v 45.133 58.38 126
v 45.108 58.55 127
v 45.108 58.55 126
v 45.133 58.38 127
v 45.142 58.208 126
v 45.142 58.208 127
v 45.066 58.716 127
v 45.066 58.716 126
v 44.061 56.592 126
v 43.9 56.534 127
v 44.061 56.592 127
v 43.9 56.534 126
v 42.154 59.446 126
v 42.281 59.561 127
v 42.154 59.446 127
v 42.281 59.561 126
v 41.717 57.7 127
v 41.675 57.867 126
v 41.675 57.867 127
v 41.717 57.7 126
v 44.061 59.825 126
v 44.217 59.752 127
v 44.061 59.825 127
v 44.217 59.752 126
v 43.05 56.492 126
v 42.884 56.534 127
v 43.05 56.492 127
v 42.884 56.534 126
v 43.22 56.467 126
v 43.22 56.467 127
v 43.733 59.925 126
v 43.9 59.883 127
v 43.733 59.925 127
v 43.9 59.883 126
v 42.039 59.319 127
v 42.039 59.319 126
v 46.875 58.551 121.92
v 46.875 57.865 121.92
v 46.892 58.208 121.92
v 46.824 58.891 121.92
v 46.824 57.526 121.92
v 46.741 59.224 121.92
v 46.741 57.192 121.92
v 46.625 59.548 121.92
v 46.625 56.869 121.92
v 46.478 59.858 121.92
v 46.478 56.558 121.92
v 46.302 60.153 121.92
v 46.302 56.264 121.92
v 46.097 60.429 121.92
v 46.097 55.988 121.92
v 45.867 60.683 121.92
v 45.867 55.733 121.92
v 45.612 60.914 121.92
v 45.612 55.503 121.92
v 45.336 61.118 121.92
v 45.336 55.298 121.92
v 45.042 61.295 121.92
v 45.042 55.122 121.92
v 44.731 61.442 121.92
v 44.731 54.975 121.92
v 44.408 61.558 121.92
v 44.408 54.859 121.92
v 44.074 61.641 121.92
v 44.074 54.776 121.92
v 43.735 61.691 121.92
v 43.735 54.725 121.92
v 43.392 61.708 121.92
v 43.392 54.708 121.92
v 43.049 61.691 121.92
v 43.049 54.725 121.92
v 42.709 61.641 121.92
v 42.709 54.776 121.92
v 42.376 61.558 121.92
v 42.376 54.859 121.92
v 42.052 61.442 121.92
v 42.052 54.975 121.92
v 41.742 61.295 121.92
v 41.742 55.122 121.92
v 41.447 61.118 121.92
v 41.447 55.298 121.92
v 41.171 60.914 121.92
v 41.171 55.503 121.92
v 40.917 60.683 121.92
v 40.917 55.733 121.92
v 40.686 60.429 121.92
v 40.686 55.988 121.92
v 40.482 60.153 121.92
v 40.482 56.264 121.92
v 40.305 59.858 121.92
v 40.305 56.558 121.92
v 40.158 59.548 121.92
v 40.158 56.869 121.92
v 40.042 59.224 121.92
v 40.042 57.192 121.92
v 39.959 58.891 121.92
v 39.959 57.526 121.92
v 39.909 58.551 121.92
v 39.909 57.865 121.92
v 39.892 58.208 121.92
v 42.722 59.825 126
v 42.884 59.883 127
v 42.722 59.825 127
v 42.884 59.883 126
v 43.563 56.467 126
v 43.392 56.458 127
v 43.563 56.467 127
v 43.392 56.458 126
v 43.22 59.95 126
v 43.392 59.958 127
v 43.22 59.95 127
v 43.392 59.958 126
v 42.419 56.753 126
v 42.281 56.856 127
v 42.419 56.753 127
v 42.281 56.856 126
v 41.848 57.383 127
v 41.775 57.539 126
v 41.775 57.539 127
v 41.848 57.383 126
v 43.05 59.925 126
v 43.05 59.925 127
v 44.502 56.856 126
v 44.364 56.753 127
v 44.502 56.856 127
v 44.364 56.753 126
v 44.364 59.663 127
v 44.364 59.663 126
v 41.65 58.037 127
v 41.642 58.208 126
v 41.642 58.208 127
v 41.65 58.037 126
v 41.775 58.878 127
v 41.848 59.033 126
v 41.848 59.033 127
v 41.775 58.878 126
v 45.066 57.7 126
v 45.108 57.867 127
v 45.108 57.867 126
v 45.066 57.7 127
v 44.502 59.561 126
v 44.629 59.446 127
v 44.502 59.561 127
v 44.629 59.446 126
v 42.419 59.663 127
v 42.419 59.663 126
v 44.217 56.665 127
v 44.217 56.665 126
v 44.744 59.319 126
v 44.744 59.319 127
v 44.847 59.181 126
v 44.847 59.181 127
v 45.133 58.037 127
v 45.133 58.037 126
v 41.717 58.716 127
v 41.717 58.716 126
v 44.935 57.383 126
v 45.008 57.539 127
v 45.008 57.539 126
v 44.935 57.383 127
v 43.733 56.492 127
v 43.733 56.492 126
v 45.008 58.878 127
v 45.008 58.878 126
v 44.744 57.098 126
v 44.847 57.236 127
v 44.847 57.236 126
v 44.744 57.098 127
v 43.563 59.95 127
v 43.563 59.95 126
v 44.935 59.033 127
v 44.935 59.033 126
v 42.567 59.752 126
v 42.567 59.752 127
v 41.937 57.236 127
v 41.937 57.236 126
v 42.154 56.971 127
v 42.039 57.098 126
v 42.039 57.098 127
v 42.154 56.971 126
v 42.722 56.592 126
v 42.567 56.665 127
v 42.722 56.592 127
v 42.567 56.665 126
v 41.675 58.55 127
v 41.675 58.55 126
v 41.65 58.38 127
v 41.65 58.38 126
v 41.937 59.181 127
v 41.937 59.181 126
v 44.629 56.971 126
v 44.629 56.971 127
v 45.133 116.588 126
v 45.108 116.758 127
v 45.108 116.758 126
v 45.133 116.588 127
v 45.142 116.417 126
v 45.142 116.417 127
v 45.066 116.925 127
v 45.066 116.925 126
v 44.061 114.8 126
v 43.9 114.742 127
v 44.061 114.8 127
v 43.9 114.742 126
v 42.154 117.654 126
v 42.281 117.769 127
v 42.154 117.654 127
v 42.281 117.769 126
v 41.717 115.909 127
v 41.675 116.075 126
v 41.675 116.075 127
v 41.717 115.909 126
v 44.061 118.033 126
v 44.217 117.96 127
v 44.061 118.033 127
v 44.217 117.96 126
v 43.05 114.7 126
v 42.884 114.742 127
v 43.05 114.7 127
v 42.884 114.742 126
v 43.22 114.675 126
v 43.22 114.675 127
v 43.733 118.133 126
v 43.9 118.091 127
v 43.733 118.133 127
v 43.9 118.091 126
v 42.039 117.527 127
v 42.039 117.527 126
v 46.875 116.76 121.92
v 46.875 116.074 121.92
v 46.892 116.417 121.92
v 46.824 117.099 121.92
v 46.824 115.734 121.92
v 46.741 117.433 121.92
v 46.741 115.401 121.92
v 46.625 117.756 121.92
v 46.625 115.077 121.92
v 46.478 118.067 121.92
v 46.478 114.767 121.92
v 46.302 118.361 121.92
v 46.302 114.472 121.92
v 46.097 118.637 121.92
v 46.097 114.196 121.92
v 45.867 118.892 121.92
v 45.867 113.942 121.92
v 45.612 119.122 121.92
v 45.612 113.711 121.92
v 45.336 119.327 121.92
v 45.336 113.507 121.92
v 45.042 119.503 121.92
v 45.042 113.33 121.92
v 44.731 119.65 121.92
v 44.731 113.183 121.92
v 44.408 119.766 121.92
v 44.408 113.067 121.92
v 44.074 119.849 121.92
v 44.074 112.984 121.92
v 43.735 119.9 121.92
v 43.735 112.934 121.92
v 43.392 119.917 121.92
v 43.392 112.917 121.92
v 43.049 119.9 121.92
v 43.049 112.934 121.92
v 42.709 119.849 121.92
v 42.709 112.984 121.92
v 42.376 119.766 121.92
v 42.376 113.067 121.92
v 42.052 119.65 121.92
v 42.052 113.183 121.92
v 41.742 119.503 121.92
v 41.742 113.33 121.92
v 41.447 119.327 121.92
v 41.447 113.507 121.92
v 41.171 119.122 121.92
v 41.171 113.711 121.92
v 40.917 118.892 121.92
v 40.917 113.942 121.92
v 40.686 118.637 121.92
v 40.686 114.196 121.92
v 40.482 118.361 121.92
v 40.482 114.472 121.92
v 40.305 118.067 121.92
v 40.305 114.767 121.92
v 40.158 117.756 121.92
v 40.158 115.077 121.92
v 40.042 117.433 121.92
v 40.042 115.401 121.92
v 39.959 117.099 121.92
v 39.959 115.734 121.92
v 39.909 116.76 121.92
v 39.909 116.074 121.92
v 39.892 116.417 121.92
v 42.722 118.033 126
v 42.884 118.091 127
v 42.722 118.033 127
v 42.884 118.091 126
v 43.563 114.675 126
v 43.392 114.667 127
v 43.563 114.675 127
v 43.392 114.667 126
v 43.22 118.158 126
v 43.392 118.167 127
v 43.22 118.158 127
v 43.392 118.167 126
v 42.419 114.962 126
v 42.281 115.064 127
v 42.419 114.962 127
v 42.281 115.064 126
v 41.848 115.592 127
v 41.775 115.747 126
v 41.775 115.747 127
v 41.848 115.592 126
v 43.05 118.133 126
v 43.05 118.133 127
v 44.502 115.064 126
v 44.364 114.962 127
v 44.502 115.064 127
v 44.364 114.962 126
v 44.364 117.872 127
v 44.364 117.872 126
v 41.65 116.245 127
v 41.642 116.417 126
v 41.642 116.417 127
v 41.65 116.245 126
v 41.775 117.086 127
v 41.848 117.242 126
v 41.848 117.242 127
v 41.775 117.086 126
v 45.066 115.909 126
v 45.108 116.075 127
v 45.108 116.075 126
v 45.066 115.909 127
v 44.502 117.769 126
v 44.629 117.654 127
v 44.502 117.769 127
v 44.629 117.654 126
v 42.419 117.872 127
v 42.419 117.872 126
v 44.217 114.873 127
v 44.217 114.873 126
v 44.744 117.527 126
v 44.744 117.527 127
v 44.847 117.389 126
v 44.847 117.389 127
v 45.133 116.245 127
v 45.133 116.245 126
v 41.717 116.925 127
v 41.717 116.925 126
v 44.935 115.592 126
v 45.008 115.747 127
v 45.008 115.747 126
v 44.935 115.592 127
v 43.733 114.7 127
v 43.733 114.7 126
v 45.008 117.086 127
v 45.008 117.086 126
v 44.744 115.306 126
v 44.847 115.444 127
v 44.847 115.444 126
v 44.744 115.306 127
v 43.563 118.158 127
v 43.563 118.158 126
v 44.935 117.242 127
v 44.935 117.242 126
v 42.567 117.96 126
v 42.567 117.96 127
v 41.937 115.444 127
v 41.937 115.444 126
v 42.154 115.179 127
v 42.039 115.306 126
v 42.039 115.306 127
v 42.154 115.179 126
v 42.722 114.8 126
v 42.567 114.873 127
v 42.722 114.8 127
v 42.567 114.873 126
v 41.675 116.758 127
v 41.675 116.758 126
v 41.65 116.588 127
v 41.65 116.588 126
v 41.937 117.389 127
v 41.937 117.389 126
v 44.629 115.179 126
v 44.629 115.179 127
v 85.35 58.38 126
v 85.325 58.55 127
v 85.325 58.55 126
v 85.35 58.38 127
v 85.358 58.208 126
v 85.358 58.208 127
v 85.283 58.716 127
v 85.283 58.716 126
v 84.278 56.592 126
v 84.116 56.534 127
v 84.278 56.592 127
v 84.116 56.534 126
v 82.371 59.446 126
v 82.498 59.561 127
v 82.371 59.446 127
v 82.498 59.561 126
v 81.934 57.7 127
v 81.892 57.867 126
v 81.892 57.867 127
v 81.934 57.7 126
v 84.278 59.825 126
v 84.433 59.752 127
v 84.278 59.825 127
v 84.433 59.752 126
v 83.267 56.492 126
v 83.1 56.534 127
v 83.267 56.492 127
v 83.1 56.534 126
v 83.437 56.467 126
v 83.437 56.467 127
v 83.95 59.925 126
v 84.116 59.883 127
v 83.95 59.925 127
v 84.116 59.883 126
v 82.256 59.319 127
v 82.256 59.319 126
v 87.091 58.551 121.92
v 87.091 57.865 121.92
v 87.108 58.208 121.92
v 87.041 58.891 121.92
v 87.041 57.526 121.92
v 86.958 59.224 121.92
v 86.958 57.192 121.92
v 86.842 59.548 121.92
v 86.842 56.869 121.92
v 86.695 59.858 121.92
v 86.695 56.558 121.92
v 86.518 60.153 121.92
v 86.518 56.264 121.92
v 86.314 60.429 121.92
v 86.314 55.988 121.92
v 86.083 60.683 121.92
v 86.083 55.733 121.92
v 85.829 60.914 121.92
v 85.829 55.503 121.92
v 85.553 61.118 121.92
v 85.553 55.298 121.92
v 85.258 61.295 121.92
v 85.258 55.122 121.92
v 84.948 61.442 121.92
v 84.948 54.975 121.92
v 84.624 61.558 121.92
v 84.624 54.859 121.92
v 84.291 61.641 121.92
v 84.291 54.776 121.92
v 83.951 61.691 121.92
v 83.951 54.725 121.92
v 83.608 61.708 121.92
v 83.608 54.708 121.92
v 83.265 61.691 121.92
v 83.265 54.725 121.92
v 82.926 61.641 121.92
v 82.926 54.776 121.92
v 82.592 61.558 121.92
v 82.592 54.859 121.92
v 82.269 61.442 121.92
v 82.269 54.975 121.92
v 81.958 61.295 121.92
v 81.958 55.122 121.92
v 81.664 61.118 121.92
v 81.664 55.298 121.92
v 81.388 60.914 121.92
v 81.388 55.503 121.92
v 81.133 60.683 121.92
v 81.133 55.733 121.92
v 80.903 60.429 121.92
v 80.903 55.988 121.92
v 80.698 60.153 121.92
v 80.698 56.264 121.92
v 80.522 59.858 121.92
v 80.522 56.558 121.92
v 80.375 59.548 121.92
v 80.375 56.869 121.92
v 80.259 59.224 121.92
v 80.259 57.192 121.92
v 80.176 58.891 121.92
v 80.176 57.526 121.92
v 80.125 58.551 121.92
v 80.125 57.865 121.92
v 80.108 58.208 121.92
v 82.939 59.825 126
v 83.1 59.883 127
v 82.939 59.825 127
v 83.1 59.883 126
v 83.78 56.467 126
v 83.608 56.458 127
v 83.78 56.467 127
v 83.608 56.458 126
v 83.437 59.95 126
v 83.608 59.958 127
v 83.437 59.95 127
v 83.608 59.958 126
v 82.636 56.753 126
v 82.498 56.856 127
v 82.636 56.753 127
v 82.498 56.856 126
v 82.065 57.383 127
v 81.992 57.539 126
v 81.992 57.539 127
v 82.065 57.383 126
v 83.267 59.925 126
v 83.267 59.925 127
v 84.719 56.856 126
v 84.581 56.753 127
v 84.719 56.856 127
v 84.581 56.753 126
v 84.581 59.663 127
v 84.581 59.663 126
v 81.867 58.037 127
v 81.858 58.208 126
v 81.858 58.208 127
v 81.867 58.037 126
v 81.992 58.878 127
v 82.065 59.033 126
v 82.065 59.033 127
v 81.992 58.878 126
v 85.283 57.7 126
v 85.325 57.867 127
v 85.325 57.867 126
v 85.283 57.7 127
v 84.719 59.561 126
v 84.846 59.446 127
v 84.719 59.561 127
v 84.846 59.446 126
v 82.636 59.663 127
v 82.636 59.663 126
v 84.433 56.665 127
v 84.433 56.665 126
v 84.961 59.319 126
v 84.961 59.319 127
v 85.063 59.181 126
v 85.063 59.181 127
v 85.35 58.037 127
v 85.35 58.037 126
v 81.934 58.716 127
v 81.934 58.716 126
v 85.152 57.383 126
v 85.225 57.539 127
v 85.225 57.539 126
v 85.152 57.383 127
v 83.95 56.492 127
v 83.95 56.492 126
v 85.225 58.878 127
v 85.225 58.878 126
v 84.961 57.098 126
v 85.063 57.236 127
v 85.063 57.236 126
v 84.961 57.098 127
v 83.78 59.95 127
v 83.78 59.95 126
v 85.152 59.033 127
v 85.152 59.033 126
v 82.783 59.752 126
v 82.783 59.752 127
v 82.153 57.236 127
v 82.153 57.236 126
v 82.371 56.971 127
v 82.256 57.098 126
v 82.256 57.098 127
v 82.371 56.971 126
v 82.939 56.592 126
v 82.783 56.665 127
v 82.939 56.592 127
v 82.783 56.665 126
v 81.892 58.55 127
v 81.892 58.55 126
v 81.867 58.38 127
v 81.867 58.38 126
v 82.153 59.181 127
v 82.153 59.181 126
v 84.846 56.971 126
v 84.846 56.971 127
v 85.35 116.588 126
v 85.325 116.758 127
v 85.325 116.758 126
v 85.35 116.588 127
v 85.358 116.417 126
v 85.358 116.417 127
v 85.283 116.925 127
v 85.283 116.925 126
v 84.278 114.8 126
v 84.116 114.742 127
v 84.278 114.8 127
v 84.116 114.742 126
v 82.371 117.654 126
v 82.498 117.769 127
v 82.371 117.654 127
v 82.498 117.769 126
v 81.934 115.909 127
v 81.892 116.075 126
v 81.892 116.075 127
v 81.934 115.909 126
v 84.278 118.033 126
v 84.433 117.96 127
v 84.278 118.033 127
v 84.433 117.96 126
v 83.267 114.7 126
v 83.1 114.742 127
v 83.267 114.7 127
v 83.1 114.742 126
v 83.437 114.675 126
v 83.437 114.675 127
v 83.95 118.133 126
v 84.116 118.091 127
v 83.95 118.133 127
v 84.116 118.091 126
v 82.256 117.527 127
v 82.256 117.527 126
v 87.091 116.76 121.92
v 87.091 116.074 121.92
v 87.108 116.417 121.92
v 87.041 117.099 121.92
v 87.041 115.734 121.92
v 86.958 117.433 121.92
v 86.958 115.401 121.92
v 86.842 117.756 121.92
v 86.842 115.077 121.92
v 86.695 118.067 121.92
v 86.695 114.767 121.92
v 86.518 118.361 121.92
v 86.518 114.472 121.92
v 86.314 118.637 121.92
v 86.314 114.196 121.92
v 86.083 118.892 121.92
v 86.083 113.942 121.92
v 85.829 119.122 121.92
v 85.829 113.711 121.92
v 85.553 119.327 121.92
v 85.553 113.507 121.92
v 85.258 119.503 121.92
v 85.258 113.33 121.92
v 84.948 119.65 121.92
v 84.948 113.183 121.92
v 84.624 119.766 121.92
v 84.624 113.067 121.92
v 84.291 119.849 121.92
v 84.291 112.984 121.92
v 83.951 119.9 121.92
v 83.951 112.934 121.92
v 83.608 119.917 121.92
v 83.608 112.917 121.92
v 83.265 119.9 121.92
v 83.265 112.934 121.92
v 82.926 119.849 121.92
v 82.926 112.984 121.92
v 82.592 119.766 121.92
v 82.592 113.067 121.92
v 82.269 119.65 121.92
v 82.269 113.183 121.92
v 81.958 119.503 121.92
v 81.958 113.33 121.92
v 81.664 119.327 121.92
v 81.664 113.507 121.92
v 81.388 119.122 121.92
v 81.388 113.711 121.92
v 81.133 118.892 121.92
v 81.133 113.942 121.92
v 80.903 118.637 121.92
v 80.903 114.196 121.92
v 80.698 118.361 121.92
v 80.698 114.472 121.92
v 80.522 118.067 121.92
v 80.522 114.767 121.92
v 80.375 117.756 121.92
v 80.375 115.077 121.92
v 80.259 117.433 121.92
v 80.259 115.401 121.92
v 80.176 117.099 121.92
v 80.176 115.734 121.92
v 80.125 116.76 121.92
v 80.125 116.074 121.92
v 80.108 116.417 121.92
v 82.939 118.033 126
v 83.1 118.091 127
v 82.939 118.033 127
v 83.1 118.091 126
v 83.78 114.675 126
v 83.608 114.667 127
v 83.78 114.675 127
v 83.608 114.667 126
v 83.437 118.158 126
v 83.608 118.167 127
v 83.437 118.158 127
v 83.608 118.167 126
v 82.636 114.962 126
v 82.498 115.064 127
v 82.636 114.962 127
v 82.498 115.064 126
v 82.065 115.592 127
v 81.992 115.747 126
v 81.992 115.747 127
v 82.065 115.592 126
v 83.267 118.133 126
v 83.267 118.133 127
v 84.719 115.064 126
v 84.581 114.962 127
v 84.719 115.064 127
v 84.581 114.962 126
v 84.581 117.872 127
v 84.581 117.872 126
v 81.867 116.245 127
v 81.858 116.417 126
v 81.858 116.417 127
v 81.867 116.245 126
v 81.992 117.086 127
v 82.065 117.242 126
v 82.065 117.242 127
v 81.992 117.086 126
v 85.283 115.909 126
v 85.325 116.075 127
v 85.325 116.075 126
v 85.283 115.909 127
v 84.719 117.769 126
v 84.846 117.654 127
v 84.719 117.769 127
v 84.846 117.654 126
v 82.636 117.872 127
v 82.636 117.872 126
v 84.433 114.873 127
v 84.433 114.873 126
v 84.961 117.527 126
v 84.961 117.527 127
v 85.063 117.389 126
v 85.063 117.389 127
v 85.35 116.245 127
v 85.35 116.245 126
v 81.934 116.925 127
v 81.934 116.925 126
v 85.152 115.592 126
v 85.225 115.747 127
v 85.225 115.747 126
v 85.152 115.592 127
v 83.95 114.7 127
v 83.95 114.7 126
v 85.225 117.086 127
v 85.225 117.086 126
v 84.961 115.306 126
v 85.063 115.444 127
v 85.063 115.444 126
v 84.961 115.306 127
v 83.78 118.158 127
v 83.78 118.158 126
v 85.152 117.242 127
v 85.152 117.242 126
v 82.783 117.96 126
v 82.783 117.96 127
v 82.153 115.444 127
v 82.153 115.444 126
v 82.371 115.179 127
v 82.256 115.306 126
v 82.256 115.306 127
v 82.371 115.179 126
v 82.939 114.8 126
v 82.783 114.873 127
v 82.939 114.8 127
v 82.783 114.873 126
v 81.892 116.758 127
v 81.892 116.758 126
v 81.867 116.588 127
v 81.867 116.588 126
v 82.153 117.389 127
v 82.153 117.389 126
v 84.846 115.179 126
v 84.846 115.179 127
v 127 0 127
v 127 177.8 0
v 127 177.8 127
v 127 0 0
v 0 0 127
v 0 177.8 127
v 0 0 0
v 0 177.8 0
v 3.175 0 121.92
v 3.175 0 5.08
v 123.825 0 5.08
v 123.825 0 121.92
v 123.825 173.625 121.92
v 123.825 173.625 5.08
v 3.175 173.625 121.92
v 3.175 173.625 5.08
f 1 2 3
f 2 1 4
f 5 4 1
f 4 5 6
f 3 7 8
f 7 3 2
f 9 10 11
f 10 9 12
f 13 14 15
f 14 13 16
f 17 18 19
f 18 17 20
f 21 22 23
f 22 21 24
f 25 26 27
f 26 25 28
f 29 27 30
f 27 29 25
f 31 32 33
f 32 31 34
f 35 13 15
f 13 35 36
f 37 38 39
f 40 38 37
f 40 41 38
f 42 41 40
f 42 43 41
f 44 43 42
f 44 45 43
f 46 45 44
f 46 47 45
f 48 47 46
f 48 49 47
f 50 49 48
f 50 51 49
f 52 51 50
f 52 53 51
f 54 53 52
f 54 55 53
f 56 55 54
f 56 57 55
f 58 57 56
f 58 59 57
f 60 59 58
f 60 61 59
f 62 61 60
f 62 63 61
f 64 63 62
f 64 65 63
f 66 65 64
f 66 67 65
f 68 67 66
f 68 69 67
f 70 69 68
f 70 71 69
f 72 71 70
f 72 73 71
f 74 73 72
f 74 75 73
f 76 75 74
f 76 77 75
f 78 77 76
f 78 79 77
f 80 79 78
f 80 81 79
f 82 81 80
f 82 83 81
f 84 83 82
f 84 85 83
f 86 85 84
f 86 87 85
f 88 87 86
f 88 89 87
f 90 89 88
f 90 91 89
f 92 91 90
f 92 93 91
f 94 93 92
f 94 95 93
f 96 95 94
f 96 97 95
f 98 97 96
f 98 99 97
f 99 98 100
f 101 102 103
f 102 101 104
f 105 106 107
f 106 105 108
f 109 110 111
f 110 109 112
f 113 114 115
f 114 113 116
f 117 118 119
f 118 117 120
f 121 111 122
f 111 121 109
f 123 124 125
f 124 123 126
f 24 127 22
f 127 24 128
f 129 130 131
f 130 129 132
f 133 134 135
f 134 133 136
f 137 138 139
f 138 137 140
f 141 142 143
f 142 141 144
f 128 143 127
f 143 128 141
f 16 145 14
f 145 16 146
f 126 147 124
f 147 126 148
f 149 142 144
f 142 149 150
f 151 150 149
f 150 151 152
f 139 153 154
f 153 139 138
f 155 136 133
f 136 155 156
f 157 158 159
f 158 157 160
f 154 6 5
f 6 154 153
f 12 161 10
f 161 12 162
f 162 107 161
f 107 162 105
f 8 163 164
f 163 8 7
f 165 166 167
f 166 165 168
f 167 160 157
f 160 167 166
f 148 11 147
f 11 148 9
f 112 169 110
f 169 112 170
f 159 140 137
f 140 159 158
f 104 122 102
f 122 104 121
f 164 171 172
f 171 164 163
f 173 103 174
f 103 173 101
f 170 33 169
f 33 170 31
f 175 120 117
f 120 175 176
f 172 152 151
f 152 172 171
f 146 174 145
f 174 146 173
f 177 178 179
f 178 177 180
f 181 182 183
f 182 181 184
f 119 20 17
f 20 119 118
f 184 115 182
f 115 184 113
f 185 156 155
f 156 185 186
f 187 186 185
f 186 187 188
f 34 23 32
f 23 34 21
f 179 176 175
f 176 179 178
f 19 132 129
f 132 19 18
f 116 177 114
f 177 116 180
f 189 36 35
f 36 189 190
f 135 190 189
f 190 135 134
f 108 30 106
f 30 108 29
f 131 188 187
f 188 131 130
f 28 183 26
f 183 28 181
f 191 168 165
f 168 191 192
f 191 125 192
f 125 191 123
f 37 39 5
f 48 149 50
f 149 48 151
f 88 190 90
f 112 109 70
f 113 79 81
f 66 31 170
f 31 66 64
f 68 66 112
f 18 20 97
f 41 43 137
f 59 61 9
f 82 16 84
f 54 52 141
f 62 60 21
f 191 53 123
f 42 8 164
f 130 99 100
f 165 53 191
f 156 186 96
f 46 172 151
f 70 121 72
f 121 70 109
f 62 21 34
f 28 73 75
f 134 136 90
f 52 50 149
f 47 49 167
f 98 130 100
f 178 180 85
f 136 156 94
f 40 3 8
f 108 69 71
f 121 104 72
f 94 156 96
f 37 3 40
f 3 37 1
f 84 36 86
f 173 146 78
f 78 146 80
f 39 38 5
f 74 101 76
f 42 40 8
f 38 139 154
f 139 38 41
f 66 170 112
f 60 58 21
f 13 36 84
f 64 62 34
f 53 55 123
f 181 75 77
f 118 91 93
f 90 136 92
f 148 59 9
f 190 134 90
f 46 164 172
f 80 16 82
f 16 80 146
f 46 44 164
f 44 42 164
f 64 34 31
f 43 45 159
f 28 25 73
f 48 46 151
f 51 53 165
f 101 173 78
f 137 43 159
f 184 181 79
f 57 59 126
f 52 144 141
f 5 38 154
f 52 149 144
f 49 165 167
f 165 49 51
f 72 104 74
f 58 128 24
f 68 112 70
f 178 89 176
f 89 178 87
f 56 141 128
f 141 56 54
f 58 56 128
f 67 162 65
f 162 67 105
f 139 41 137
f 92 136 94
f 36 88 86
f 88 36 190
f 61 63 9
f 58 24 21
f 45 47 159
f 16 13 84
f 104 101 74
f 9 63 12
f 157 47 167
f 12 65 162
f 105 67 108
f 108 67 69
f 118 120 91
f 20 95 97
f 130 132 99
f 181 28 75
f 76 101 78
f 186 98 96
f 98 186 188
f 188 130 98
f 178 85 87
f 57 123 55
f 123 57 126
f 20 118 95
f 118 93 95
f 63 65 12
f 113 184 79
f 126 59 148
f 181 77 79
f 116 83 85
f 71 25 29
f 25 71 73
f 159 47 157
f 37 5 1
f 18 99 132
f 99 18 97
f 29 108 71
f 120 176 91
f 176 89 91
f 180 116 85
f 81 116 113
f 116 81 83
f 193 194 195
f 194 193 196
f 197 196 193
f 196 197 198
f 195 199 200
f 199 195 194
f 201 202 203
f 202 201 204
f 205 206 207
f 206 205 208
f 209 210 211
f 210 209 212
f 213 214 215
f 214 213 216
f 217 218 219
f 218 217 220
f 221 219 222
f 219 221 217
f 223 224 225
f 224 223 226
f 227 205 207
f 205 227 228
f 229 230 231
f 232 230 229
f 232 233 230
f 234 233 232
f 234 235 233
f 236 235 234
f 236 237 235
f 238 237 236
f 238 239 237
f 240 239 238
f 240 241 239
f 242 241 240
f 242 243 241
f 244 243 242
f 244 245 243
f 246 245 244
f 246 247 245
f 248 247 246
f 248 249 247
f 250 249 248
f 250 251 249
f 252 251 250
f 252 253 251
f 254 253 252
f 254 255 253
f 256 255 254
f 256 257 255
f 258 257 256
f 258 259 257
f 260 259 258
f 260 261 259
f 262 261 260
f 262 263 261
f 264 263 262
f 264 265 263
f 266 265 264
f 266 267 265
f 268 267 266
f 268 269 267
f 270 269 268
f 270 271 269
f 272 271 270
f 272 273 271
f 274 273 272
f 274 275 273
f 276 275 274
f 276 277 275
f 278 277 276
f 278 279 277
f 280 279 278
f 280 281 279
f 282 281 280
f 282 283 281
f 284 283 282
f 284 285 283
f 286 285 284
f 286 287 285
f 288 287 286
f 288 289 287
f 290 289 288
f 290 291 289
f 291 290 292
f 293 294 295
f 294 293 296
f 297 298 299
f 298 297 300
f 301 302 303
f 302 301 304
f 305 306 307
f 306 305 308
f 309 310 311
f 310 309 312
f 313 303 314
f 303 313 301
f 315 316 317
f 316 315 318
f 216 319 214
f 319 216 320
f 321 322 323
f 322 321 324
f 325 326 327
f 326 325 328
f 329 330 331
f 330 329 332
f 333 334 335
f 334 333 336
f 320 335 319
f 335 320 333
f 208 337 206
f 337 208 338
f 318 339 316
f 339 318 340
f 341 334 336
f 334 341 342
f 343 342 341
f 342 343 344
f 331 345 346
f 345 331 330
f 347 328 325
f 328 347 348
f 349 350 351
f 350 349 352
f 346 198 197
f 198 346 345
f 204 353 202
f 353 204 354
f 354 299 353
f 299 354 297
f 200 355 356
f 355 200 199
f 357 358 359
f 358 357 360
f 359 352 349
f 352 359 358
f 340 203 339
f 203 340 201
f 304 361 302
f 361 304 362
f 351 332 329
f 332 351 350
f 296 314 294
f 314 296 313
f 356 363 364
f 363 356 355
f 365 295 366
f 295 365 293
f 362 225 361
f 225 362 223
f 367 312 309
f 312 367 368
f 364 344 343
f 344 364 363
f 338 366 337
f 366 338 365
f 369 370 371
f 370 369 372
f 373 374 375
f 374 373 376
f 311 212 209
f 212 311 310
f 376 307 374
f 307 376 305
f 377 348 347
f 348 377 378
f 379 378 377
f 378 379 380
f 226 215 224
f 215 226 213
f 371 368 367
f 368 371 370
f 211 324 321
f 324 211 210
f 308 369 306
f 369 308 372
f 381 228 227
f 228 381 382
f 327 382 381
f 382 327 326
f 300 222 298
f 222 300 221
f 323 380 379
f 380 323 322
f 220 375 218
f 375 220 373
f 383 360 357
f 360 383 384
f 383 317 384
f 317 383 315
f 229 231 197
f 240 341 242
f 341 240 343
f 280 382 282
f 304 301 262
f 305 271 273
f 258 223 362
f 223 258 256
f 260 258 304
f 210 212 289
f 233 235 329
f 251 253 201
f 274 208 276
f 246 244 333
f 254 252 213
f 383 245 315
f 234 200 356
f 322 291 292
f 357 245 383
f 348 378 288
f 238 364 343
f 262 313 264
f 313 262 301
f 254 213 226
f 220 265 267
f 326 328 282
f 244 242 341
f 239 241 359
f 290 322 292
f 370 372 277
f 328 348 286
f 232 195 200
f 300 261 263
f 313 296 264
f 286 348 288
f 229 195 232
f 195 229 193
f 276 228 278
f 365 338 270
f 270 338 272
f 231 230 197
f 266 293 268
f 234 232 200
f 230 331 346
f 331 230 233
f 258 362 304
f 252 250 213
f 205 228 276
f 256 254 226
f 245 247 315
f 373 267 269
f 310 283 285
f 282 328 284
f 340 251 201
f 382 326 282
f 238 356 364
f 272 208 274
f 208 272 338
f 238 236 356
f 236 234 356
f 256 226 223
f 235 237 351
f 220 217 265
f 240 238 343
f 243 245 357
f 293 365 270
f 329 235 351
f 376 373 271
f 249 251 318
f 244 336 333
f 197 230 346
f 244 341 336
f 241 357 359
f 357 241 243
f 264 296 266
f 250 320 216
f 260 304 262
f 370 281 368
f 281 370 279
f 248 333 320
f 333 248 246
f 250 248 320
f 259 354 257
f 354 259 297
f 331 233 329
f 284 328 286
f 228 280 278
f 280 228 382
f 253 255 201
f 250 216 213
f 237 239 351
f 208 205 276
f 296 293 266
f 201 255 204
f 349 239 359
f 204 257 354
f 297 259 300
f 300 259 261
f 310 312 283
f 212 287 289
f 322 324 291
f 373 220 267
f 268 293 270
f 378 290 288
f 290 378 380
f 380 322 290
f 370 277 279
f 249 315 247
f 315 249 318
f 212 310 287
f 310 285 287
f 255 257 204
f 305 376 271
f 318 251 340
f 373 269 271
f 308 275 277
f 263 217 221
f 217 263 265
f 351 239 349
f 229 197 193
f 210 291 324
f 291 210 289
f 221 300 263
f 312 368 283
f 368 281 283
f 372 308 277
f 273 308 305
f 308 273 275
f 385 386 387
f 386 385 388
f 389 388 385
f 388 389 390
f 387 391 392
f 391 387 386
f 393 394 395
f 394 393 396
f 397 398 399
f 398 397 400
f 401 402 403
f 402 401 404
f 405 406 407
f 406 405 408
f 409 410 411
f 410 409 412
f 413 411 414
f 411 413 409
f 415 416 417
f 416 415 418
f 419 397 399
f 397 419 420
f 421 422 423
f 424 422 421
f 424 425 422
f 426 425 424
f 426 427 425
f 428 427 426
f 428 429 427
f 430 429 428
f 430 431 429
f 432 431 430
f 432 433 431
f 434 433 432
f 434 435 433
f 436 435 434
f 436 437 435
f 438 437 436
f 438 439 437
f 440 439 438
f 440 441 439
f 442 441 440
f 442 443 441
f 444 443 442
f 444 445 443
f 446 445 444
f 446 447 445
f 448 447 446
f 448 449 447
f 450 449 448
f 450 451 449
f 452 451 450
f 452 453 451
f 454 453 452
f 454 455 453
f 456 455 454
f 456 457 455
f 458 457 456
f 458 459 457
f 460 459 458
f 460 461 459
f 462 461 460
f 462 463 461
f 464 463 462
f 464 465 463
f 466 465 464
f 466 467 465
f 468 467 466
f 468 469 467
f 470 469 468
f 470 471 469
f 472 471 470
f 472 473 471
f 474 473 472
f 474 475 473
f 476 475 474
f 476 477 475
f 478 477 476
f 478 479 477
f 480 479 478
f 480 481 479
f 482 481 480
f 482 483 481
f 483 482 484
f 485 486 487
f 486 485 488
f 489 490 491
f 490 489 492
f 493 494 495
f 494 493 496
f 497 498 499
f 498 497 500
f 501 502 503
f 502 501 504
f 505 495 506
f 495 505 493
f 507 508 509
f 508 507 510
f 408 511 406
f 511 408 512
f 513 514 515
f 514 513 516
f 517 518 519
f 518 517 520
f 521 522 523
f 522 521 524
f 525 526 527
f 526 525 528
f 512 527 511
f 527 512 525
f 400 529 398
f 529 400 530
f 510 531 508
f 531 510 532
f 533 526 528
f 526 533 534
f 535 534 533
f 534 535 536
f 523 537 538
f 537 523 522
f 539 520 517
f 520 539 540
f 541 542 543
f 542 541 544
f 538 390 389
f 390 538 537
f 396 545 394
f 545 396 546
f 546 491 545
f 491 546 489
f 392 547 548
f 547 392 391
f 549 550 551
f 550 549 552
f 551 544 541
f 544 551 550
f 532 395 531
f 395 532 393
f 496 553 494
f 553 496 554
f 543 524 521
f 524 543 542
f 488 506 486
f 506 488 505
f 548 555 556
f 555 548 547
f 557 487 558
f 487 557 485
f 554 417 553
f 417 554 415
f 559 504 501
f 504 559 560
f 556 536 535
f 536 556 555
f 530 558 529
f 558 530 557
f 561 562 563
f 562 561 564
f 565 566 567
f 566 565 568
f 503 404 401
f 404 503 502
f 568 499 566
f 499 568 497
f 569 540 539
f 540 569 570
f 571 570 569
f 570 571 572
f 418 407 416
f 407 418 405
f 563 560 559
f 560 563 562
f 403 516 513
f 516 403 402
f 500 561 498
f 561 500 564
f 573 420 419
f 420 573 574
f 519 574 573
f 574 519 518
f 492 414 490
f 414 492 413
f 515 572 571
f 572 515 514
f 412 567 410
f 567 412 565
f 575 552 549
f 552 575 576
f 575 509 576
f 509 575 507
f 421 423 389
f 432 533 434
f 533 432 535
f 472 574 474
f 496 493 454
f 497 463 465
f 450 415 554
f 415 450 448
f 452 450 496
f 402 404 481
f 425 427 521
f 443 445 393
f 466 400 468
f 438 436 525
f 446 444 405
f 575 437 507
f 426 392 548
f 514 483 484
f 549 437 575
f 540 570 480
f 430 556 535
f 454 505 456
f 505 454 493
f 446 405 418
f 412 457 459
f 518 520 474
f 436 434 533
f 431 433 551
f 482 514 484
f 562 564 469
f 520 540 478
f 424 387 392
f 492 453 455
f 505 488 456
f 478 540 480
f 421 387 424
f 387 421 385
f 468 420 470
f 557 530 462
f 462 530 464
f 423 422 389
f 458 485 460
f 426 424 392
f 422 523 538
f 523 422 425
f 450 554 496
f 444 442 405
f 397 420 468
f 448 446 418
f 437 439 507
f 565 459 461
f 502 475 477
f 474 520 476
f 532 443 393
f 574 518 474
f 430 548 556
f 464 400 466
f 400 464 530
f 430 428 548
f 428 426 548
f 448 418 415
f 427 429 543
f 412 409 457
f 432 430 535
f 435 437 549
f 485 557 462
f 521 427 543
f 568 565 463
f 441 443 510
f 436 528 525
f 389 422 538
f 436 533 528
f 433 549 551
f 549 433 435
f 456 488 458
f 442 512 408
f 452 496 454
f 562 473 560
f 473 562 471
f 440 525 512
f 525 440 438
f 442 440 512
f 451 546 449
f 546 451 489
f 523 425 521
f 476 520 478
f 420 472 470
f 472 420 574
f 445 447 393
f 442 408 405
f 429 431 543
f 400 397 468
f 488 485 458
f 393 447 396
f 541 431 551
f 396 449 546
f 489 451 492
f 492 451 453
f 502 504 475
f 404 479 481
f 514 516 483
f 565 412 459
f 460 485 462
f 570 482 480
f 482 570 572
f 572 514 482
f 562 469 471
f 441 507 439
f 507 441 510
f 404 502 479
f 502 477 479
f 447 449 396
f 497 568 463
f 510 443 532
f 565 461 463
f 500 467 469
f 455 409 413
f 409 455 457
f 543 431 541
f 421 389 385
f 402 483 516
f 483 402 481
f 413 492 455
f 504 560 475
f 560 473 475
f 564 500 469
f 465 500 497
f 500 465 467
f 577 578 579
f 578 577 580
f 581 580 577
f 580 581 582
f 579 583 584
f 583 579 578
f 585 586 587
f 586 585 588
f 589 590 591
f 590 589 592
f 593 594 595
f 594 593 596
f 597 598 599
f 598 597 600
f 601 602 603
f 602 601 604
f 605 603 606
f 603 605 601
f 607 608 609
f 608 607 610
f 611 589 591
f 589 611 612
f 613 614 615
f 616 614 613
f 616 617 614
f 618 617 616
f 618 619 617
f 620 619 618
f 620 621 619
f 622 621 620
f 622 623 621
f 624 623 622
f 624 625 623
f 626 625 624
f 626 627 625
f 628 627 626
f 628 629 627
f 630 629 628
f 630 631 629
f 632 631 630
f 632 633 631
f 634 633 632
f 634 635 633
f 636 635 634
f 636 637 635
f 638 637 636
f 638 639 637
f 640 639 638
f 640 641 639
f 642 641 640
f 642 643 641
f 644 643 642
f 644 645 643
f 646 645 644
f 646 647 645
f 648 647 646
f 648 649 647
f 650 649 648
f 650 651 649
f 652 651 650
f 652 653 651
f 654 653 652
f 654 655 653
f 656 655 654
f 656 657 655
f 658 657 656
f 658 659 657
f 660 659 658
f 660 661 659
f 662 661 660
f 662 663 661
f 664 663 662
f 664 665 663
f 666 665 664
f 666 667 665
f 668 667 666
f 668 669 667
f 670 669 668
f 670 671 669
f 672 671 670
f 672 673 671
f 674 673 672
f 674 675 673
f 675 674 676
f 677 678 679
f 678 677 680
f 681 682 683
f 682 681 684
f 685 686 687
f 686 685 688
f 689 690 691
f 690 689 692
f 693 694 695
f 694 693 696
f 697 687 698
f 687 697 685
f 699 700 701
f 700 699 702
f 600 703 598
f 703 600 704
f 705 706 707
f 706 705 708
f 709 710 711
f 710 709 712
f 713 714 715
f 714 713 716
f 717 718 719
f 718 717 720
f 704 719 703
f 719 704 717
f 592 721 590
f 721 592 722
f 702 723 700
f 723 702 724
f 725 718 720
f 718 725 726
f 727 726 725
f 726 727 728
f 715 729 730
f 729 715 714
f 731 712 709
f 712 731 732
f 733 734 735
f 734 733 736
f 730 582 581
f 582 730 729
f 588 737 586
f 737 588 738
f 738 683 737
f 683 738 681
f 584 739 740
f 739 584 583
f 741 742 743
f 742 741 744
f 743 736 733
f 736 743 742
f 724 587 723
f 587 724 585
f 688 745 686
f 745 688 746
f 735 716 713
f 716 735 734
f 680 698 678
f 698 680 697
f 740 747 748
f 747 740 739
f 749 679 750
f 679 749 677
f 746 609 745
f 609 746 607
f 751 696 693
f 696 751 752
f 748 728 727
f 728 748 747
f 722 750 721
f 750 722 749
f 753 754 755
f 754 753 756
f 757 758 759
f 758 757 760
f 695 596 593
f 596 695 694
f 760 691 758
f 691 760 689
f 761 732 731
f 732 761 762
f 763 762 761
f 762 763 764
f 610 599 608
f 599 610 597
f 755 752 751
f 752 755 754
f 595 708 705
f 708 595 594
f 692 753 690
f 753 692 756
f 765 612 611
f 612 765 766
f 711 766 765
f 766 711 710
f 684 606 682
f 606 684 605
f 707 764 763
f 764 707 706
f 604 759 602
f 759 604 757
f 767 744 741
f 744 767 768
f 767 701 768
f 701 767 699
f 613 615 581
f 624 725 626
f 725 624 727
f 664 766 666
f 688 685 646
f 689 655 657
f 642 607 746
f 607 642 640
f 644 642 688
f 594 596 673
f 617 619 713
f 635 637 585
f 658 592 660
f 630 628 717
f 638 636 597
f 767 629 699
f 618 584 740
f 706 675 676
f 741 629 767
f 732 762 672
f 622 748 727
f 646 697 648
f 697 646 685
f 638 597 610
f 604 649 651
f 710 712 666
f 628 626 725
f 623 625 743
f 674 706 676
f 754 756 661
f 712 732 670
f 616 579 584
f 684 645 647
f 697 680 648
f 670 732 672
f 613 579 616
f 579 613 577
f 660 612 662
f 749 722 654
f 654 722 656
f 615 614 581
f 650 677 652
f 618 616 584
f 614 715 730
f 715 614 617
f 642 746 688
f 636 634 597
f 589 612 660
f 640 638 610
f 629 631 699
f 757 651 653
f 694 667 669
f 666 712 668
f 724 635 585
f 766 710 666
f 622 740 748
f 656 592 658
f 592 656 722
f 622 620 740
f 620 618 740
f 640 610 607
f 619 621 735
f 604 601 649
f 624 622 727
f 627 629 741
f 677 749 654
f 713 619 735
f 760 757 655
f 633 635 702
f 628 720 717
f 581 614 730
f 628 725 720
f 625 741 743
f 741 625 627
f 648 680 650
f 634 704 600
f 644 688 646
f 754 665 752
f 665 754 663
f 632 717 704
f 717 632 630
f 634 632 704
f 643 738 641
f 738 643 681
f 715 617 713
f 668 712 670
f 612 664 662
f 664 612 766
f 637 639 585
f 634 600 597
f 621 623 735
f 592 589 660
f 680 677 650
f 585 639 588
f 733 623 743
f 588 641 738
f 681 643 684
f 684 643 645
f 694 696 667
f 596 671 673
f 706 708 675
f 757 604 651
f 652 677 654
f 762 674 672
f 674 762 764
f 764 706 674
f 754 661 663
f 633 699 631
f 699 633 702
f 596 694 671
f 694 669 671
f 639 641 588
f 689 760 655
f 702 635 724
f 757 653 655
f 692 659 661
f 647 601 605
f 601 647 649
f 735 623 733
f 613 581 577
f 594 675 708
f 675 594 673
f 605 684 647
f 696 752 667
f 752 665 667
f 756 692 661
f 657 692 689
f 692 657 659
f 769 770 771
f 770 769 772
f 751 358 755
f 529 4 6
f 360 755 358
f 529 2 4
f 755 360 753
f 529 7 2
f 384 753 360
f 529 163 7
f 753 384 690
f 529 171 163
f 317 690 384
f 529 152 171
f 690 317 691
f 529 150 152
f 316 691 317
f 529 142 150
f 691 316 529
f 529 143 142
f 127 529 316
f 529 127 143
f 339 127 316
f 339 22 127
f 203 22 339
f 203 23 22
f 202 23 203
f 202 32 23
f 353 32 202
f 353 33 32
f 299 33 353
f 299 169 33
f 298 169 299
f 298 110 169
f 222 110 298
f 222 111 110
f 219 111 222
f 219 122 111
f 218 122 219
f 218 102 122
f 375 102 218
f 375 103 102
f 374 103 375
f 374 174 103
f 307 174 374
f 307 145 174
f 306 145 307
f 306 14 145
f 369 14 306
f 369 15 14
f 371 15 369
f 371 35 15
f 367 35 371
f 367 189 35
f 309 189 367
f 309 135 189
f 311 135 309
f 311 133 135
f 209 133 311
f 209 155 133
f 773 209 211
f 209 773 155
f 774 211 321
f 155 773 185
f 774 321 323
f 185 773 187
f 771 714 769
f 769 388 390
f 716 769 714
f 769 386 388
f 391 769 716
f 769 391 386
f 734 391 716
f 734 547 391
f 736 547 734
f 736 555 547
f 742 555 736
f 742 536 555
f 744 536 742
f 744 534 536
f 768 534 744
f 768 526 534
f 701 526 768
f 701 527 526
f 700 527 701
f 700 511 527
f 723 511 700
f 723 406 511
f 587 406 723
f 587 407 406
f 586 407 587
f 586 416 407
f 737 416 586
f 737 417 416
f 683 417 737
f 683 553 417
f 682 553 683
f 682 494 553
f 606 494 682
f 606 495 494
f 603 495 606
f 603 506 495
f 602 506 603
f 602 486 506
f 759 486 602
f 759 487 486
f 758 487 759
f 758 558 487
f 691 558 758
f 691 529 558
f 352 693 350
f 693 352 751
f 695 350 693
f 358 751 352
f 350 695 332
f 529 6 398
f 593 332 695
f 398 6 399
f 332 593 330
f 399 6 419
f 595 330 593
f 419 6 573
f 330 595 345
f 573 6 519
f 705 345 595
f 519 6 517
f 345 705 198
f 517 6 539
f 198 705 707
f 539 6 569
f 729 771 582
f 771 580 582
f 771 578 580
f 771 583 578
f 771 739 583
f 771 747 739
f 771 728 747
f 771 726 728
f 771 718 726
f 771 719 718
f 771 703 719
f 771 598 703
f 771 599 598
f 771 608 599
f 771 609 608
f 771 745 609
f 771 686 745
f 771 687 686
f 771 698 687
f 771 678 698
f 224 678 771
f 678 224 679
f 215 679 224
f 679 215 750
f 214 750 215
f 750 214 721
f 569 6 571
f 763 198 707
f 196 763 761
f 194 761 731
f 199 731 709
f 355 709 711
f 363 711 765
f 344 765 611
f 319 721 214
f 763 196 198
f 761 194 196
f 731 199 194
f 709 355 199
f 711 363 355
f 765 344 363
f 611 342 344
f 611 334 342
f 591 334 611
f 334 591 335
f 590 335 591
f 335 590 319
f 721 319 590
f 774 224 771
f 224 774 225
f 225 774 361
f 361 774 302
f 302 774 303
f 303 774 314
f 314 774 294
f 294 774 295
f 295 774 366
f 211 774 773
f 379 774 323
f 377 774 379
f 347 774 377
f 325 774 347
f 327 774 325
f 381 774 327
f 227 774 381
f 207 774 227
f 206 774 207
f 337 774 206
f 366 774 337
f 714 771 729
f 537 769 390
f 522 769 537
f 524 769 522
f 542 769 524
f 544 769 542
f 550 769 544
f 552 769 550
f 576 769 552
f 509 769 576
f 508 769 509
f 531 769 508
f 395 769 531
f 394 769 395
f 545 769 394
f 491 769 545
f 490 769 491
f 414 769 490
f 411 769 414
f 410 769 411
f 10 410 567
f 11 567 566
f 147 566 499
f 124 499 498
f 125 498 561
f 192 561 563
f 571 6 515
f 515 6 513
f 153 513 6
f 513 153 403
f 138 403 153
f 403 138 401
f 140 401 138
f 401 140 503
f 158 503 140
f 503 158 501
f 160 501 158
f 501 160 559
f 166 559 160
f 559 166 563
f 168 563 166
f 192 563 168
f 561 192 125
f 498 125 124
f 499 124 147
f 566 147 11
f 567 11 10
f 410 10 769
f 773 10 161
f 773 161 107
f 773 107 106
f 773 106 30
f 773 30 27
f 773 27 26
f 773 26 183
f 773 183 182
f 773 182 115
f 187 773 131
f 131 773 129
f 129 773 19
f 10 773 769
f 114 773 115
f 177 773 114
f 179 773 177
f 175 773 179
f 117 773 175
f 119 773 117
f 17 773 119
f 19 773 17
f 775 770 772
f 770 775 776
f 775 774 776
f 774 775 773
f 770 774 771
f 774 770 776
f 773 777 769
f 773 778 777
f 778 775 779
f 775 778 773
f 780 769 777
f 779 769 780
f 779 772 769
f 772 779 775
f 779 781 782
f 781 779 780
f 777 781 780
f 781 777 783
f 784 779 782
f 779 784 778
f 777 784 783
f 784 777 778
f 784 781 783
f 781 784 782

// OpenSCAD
// ============================================================
// Under-Desk Speaker Housing — Friction-Fit Monolithic Block
// ============================================================
// Speaker : 5" W × 4.5" H × 11" D  (front face = 5" × 4.5")
// Housing : 5" W × 5" H × 7" D
//
// Design approach: start from a solid 5"×5"×7" block and
// subtract material.
//
//   Step 1 (this file) — Main speaker cavity:
//     • 1/8" side walls (left & right)
//     • ~0.2" top & bottom margins (cavity centred in height)
//     • 1/8" back wall
//     • Speaker slides in from the front face; friction holds it.
//
// MOUNTING (screws fully concealed):
//   The 4 mounting screw holes are on the INNER CEILING of the
//   cavity.  After positioning the housing against the desk:
//     1. Reach inside with a screwdriver.
//     2. Drive 4 screws upward through the ceiling into the desk.
//     3. Slide the speaker in → screw heads are completely hidden.
//   Recommended screw: #6 × 1-1/2" flat-head wood screw.
//
// PRINT ORIENTATION:
//   Stand the housing with its FRONT FACE flat on the build plate.
//   The cavity opening faces down — no internal supports needed.
//   The 7" depth becomes the print height (~178 mm).
//
// ============================================================

inch = 25.4;
$fn  = 64;

// ── Block ─────────────────────────────────────────────────────
BW = 5.0 * inch;   // block width   (X, left ↔ right)  127.00 mm
BH = 5.0 * inch;   // block height  (Z, up  ↔ down)    127.00 mm
BD = 7.0 * inch;   // block depth   (Y, front ↔ back)  177.80 mm

// ── Cavity ────────────────────────────────────────────────────
//   Width : 5" − 2×(1/8") = 4.75"    ← "1/8 on each side"
//   Height: 4.6" centred in 5" block  ← "centred, 4.6" high"
//   Depth : 7" − 1/8"   = 6.875"     ← "goes to 1/8 of the back"

SIDE_WALL = (1/8) * inch;          //  3.175 mm per side
BACK_WALL = (1/8) * inch;          //  3.175 mm back wall

CAV_W = BW - 2 * SIDE_WALL;        //  4.75"  = 120.650 mm
CAV_H = 4.6 * inch;                //  4.6"   = 116.840 mm
CAV_D = BD - BACK_WALL;            //  6.875" = 174.625 mm

// Equal top & bottom margins (cavity centred vertically)
CAV_Z = (BH - CAV_H) / 2;          //  ≈ 0.2"  = 5.080 mm

// ── Mounting screws ───────────────────────────────────────────
// Ceiling thickness = CAV_Z ≈ 5 mm.
// Countersink opens into the cavity; screw bites into desk above.
CEIL_T  = CAV_Z;          // ceiling wall thickness [mm]
SC_D    = 3.5;             // shaft diameter   [mm]  (#6 wood screw)
SC_HD   = 7.0;             // head  diameter   [mm]
SC_CS   = CEIL_T - 1.0;   // countersink depth (leaves 1 mm land)

// 2 × 2 grid, evenly distributed inside the cavity footprint
SC_NX = 2;
SC_NY = 2;

// ─────────────────────────────────────────────────────────────
// Countersink hole oriented upward (into the desk).
// Z = 0 here → inner cavity-ceiling face (wide / head recess).
// Z = CEIL_T  → outer top face (exits into desk wood).
module ceiling_screw() {
    cylinder(d=SC_D,  h=CEIL_T + 1);        // shaft through wall
    cylinder(d1=SC_HD, d2=SC_D, h=SC_CS);   // countersink cone
}

// ─────────────────────────────────────────────────────────────
module housing() {
    difference() {

        // ── Solid 5"×7"×5" block ───────────────────────────
        cube([BW, BD, BH]);

        // ── Main cavity ────────────────────────────────────
        // Opens at Y = 0 (front face). Speaker slides in along +Y.
        translate([SIDE_WALL, -1, CAV_Z])
            cube([CAV_W, CAV_D, CAV_H]);

        // ── Mounting screw holes in cavity ceiling ──────────
        // Inner ceiling face is at Z = CAV_Z + CAV_H.
        cz       = CAV_Z + CAV_H;
        pitch_x  = CAV_W  / (SC_NX + 1);
        pitch_y  = CAV_D  / (SC_NY + 1);

        for (ix = [1 : SC_NX])
            for (iy = [1 : SC_NY])
                translate([
                    SIDE_WALL + ix * pitch_x,
                    iy * pitch_y,
                    cz
                ])
                    ceiling_screw();
    }
}

// ── Render ───────────────────────────────────────────────────
housing();

// ── Console output ────────────────────────────────────────────
echo(str("─── Housing ──────────────────────────────────────────"));
echo(str("Block          : ", BW/inch, "\" W × ", BH/inch,
         "\" H × ", BD/inch, "\" D"));
echo(str("Cavity         : ", CAV_W/inch, "\" W × ", CAV_H/inch,
         "\" H × ", CAV_D/inch, "\" D"));
echo(str("Side walls     : ", SIDE_WALL, " mm (1/8\")"));
echo(str("Back wall      : ", BACK_WALL, " mm (1/8\")"));
echo(str("Top/bot margin : ", CAV_Z, " mm (~0.2\") — ceiling for screws"));
echo(str("──────────────────────────────────────────────────────"));
